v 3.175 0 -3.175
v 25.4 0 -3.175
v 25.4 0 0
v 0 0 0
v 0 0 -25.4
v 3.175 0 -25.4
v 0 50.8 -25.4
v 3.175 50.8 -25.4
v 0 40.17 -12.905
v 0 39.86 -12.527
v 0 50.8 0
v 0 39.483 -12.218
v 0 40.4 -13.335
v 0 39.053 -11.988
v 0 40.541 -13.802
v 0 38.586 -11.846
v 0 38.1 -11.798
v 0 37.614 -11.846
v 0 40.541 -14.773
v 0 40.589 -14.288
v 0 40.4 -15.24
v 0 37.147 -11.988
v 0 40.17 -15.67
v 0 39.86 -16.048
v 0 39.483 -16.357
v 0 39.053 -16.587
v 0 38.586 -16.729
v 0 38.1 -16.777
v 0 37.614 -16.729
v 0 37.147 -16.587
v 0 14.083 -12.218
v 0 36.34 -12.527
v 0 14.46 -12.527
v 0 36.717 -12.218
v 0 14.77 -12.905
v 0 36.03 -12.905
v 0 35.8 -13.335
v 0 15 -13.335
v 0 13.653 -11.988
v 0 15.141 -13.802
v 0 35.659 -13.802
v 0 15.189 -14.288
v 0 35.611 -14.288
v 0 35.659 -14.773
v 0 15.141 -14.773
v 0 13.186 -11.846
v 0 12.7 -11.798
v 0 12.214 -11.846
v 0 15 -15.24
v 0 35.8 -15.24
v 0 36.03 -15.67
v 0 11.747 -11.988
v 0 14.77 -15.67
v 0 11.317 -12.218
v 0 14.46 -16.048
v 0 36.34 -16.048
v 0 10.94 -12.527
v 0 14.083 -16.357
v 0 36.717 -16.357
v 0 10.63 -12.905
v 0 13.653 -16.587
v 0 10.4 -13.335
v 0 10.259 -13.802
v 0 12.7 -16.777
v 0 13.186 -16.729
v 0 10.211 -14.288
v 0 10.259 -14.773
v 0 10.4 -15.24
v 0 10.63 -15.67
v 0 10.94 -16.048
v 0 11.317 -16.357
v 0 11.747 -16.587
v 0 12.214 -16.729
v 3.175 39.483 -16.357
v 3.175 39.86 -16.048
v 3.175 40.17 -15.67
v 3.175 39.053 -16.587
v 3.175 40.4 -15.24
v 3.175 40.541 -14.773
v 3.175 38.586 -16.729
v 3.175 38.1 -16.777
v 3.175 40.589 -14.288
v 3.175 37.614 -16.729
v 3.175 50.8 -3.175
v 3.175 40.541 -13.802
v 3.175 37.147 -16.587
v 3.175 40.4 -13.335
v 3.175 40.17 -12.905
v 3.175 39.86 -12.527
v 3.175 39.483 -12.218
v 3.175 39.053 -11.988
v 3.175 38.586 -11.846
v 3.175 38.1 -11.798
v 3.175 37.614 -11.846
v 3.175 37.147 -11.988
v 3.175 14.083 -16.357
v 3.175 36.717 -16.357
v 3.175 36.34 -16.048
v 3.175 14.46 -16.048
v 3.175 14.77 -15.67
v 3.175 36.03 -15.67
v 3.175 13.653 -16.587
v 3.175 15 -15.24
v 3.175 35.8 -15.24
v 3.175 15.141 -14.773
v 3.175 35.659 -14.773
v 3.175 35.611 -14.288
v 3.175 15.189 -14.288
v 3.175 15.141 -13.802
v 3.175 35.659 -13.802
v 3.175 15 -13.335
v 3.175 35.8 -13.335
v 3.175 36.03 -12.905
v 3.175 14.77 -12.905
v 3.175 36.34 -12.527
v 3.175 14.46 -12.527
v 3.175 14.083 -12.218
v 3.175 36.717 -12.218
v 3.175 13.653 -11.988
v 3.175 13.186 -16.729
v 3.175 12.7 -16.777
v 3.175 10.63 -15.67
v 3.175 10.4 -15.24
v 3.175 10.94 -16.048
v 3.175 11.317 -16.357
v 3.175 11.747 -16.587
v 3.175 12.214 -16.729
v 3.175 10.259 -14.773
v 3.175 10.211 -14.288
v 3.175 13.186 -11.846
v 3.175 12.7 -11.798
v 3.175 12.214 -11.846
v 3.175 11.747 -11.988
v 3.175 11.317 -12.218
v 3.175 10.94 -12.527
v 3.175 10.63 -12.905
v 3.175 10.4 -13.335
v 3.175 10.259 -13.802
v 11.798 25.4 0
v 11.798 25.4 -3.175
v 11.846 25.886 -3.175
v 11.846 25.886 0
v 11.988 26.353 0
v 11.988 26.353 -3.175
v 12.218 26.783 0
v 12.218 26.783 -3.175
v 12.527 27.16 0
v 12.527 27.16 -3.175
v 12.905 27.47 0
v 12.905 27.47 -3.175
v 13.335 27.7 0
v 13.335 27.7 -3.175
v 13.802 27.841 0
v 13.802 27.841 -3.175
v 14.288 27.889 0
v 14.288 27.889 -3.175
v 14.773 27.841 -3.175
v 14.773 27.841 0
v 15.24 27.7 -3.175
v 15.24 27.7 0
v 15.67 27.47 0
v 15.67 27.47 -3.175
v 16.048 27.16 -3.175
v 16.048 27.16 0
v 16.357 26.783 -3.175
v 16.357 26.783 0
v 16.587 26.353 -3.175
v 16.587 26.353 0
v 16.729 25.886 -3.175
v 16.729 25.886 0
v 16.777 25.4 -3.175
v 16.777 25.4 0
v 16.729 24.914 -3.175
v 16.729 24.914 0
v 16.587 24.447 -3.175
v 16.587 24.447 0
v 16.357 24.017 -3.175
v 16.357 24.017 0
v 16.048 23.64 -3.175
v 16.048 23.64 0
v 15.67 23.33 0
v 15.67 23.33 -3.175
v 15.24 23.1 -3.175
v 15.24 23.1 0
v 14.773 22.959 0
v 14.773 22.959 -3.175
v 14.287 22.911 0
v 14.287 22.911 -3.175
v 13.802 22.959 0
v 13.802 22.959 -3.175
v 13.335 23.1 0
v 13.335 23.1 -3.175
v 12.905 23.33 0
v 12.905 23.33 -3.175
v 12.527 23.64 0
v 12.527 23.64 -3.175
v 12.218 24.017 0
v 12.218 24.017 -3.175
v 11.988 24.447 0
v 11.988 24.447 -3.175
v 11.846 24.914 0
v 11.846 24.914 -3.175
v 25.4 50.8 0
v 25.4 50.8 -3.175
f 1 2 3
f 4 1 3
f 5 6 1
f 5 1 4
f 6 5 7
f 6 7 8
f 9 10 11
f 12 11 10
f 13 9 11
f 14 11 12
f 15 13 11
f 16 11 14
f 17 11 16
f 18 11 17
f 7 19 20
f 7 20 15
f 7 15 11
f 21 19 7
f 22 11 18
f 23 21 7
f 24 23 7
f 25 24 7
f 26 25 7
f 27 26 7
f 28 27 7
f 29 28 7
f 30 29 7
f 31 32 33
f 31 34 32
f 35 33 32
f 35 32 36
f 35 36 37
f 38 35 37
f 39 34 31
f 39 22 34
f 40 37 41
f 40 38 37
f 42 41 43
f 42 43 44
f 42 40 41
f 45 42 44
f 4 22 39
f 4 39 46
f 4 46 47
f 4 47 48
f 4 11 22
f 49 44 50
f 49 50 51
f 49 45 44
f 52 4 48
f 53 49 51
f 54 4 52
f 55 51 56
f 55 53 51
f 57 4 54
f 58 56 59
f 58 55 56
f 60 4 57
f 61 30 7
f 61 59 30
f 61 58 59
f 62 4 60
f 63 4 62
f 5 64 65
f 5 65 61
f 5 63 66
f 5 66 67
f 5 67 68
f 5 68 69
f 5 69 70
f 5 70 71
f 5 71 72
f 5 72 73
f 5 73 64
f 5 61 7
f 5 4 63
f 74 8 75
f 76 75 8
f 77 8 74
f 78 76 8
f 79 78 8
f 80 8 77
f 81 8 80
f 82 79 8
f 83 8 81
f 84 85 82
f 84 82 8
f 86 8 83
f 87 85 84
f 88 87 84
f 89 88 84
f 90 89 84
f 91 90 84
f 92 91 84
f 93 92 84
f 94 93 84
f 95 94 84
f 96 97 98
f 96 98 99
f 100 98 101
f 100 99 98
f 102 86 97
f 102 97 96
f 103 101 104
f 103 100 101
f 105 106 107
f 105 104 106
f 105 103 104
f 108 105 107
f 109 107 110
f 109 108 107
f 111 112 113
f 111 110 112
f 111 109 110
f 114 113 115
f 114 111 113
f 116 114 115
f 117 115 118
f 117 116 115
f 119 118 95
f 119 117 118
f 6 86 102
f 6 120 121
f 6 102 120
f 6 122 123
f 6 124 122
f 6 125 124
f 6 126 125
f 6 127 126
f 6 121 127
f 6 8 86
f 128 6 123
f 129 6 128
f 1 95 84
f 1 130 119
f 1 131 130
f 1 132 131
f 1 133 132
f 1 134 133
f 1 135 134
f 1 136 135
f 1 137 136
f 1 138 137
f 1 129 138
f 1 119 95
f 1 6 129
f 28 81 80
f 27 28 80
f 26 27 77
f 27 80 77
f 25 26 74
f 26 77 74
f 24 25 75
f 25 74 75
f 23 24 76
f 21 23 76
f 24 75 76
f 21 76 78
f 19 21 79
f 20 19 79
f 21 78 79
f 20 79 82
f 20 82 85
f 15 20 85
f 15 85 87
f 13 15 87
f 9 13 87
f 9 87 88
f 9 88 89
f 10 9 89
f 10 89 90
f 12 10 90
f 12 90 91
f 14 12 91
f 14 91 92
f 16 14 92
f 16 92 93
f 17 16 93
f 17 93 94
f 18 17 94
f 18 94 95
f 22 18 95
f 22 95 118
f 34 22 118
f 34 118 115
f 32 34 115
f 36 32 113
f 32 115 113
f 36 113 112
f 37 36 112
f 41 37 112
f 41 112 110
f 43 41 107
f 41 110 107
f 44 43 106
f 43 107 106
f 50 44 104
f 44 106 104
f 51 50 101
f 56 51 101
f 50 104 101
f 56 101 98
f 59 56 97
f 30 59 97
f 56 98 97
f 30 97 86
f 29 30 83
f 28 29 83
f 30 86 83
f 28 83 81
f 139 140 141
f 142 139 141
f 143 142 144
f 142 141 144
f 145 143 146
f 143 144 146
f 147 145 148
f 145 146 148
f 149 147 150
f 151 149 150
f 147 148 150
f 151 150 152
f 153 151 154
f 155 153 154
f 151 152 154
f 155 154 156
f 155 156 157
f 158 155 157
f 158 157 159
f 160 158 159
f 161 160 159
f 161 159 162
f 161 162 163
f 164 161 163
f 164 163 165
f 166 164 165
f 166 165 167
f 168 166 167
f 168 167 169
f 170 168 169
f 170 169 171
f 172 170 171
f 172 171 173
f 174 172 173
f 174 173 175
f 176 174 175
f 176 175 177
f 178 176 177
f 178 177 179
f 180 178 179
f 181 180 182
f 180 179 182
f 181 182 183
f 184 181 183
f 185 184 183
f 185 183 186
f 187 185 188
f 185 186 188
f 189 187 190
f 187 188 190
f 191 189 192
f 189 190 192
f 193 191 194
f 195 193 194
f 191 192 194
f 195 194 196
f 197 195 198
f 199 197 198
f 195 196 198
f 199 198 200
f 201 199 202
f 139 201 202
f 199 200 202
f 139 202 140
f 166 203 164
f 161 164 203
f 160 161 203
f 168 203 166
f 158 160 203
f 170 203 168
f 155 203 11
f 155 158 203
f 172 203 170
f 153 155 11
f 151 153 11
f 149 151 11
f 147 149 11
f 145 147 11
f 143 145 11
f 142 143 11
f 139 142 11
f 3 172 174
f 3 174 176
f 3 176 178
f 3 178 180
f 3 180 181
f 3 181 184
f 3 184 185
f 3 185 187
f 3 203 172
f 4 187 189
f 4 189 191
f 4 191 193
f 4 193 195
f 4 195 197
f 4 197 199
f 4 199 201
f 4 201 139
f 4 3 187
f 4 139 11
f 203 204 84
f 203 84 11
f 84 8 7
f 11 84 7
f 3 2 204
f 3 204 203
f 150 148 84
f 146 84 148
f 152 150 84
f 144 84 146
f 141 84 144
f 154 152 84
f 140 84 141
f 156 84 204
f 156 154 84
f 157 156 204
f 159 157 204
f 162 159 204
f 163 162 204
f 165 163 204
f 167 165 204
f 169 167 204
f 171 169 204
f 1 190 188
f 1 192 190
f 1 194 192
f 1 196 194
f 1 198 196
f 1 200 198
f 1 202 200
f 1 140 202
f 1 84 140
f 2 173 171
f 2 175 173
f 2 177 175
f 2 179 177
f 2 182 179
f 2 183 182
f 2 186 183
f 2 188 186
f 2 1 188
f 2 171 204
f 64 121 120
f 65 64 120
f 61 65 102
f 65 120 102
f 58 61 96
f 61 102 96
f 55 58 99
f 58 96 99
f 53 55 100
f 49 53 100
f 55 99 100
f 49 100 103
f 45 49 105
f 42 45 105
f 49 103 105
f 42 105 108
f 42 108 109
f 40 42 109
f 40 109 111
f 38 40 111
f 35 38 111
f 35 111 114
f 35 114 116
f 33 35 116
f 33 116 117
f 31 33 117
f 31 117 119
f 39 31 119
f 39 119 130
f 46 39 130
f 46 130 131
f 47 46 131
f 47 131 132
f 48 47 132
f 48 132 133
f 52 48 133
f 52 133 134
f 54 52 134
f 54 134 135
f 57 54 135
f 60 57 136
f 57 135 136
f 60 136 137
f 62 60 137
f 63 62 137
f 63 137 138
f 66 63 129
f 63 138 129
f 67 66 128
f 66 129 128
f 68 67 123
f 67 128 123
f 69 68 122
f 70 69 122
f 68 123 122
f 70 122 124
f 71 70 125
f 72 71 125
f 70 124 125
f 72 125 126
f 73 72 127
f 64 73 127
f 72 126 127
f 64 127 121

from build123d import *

# Parameters (mm, degrees)
BOSS_EXTRUDE1_DEPTH = 50.8
SKETCH3_R           = 2.4892
CUT_EXTRUDE1_DEPTH  = 4.175
SKETCH4_R           = 2.4892
CUT_EXTRUDE2_DEPTH  = 4.175


with BuildPart() as part:
    # Sketch1 → Boss-Extrude1 (new body)
    with BuildSketch(Plane(origin=(0, 0, 0), x_dir=(1, 0, 0), z_dir=(0, 1, 0))):
        Polygon((3.175, 3.175), (25.4, 3.175), (25.4, 0), (0, 0), (0, 25.4), (3.175, 25.4), align=None)
    extrude(amount=BOSS_EXTRUDE1_DEPTH)

    # Sketch3 → Cut-Extrude1 (cut, through all)
    with BuildSketch(Plane(origin=(0, 0, -3.175), x_dir=(-1, 0, 0), z_dir=(0, 0, -1))):
        with Locations((-14.2875, 25.4)):
            Circle(SKETCH3_R)
    extrude(amount=-CUT_EXTRUDE1_DEPTH, mode=Mode.SUBTRACT)

    # Sketch4 → Cut-Extrude2 (cut, through all)
    with BuildSketch(Plane(origin=(3.175, 0, 0), x_dir=(0, 0, -1), z_dir=(1, 0, 0))):
        with Locations((14.2875, 12.7)):
            Circle(SKETCH4_R)
        with Locations((14.2875, 38.1)):
            Circle(SKETCH4_R)
    extrude(amount=-CUT_EXTRUDE2_DEPTH, mode=Mode.SUBTRACT)


solid = part.part
